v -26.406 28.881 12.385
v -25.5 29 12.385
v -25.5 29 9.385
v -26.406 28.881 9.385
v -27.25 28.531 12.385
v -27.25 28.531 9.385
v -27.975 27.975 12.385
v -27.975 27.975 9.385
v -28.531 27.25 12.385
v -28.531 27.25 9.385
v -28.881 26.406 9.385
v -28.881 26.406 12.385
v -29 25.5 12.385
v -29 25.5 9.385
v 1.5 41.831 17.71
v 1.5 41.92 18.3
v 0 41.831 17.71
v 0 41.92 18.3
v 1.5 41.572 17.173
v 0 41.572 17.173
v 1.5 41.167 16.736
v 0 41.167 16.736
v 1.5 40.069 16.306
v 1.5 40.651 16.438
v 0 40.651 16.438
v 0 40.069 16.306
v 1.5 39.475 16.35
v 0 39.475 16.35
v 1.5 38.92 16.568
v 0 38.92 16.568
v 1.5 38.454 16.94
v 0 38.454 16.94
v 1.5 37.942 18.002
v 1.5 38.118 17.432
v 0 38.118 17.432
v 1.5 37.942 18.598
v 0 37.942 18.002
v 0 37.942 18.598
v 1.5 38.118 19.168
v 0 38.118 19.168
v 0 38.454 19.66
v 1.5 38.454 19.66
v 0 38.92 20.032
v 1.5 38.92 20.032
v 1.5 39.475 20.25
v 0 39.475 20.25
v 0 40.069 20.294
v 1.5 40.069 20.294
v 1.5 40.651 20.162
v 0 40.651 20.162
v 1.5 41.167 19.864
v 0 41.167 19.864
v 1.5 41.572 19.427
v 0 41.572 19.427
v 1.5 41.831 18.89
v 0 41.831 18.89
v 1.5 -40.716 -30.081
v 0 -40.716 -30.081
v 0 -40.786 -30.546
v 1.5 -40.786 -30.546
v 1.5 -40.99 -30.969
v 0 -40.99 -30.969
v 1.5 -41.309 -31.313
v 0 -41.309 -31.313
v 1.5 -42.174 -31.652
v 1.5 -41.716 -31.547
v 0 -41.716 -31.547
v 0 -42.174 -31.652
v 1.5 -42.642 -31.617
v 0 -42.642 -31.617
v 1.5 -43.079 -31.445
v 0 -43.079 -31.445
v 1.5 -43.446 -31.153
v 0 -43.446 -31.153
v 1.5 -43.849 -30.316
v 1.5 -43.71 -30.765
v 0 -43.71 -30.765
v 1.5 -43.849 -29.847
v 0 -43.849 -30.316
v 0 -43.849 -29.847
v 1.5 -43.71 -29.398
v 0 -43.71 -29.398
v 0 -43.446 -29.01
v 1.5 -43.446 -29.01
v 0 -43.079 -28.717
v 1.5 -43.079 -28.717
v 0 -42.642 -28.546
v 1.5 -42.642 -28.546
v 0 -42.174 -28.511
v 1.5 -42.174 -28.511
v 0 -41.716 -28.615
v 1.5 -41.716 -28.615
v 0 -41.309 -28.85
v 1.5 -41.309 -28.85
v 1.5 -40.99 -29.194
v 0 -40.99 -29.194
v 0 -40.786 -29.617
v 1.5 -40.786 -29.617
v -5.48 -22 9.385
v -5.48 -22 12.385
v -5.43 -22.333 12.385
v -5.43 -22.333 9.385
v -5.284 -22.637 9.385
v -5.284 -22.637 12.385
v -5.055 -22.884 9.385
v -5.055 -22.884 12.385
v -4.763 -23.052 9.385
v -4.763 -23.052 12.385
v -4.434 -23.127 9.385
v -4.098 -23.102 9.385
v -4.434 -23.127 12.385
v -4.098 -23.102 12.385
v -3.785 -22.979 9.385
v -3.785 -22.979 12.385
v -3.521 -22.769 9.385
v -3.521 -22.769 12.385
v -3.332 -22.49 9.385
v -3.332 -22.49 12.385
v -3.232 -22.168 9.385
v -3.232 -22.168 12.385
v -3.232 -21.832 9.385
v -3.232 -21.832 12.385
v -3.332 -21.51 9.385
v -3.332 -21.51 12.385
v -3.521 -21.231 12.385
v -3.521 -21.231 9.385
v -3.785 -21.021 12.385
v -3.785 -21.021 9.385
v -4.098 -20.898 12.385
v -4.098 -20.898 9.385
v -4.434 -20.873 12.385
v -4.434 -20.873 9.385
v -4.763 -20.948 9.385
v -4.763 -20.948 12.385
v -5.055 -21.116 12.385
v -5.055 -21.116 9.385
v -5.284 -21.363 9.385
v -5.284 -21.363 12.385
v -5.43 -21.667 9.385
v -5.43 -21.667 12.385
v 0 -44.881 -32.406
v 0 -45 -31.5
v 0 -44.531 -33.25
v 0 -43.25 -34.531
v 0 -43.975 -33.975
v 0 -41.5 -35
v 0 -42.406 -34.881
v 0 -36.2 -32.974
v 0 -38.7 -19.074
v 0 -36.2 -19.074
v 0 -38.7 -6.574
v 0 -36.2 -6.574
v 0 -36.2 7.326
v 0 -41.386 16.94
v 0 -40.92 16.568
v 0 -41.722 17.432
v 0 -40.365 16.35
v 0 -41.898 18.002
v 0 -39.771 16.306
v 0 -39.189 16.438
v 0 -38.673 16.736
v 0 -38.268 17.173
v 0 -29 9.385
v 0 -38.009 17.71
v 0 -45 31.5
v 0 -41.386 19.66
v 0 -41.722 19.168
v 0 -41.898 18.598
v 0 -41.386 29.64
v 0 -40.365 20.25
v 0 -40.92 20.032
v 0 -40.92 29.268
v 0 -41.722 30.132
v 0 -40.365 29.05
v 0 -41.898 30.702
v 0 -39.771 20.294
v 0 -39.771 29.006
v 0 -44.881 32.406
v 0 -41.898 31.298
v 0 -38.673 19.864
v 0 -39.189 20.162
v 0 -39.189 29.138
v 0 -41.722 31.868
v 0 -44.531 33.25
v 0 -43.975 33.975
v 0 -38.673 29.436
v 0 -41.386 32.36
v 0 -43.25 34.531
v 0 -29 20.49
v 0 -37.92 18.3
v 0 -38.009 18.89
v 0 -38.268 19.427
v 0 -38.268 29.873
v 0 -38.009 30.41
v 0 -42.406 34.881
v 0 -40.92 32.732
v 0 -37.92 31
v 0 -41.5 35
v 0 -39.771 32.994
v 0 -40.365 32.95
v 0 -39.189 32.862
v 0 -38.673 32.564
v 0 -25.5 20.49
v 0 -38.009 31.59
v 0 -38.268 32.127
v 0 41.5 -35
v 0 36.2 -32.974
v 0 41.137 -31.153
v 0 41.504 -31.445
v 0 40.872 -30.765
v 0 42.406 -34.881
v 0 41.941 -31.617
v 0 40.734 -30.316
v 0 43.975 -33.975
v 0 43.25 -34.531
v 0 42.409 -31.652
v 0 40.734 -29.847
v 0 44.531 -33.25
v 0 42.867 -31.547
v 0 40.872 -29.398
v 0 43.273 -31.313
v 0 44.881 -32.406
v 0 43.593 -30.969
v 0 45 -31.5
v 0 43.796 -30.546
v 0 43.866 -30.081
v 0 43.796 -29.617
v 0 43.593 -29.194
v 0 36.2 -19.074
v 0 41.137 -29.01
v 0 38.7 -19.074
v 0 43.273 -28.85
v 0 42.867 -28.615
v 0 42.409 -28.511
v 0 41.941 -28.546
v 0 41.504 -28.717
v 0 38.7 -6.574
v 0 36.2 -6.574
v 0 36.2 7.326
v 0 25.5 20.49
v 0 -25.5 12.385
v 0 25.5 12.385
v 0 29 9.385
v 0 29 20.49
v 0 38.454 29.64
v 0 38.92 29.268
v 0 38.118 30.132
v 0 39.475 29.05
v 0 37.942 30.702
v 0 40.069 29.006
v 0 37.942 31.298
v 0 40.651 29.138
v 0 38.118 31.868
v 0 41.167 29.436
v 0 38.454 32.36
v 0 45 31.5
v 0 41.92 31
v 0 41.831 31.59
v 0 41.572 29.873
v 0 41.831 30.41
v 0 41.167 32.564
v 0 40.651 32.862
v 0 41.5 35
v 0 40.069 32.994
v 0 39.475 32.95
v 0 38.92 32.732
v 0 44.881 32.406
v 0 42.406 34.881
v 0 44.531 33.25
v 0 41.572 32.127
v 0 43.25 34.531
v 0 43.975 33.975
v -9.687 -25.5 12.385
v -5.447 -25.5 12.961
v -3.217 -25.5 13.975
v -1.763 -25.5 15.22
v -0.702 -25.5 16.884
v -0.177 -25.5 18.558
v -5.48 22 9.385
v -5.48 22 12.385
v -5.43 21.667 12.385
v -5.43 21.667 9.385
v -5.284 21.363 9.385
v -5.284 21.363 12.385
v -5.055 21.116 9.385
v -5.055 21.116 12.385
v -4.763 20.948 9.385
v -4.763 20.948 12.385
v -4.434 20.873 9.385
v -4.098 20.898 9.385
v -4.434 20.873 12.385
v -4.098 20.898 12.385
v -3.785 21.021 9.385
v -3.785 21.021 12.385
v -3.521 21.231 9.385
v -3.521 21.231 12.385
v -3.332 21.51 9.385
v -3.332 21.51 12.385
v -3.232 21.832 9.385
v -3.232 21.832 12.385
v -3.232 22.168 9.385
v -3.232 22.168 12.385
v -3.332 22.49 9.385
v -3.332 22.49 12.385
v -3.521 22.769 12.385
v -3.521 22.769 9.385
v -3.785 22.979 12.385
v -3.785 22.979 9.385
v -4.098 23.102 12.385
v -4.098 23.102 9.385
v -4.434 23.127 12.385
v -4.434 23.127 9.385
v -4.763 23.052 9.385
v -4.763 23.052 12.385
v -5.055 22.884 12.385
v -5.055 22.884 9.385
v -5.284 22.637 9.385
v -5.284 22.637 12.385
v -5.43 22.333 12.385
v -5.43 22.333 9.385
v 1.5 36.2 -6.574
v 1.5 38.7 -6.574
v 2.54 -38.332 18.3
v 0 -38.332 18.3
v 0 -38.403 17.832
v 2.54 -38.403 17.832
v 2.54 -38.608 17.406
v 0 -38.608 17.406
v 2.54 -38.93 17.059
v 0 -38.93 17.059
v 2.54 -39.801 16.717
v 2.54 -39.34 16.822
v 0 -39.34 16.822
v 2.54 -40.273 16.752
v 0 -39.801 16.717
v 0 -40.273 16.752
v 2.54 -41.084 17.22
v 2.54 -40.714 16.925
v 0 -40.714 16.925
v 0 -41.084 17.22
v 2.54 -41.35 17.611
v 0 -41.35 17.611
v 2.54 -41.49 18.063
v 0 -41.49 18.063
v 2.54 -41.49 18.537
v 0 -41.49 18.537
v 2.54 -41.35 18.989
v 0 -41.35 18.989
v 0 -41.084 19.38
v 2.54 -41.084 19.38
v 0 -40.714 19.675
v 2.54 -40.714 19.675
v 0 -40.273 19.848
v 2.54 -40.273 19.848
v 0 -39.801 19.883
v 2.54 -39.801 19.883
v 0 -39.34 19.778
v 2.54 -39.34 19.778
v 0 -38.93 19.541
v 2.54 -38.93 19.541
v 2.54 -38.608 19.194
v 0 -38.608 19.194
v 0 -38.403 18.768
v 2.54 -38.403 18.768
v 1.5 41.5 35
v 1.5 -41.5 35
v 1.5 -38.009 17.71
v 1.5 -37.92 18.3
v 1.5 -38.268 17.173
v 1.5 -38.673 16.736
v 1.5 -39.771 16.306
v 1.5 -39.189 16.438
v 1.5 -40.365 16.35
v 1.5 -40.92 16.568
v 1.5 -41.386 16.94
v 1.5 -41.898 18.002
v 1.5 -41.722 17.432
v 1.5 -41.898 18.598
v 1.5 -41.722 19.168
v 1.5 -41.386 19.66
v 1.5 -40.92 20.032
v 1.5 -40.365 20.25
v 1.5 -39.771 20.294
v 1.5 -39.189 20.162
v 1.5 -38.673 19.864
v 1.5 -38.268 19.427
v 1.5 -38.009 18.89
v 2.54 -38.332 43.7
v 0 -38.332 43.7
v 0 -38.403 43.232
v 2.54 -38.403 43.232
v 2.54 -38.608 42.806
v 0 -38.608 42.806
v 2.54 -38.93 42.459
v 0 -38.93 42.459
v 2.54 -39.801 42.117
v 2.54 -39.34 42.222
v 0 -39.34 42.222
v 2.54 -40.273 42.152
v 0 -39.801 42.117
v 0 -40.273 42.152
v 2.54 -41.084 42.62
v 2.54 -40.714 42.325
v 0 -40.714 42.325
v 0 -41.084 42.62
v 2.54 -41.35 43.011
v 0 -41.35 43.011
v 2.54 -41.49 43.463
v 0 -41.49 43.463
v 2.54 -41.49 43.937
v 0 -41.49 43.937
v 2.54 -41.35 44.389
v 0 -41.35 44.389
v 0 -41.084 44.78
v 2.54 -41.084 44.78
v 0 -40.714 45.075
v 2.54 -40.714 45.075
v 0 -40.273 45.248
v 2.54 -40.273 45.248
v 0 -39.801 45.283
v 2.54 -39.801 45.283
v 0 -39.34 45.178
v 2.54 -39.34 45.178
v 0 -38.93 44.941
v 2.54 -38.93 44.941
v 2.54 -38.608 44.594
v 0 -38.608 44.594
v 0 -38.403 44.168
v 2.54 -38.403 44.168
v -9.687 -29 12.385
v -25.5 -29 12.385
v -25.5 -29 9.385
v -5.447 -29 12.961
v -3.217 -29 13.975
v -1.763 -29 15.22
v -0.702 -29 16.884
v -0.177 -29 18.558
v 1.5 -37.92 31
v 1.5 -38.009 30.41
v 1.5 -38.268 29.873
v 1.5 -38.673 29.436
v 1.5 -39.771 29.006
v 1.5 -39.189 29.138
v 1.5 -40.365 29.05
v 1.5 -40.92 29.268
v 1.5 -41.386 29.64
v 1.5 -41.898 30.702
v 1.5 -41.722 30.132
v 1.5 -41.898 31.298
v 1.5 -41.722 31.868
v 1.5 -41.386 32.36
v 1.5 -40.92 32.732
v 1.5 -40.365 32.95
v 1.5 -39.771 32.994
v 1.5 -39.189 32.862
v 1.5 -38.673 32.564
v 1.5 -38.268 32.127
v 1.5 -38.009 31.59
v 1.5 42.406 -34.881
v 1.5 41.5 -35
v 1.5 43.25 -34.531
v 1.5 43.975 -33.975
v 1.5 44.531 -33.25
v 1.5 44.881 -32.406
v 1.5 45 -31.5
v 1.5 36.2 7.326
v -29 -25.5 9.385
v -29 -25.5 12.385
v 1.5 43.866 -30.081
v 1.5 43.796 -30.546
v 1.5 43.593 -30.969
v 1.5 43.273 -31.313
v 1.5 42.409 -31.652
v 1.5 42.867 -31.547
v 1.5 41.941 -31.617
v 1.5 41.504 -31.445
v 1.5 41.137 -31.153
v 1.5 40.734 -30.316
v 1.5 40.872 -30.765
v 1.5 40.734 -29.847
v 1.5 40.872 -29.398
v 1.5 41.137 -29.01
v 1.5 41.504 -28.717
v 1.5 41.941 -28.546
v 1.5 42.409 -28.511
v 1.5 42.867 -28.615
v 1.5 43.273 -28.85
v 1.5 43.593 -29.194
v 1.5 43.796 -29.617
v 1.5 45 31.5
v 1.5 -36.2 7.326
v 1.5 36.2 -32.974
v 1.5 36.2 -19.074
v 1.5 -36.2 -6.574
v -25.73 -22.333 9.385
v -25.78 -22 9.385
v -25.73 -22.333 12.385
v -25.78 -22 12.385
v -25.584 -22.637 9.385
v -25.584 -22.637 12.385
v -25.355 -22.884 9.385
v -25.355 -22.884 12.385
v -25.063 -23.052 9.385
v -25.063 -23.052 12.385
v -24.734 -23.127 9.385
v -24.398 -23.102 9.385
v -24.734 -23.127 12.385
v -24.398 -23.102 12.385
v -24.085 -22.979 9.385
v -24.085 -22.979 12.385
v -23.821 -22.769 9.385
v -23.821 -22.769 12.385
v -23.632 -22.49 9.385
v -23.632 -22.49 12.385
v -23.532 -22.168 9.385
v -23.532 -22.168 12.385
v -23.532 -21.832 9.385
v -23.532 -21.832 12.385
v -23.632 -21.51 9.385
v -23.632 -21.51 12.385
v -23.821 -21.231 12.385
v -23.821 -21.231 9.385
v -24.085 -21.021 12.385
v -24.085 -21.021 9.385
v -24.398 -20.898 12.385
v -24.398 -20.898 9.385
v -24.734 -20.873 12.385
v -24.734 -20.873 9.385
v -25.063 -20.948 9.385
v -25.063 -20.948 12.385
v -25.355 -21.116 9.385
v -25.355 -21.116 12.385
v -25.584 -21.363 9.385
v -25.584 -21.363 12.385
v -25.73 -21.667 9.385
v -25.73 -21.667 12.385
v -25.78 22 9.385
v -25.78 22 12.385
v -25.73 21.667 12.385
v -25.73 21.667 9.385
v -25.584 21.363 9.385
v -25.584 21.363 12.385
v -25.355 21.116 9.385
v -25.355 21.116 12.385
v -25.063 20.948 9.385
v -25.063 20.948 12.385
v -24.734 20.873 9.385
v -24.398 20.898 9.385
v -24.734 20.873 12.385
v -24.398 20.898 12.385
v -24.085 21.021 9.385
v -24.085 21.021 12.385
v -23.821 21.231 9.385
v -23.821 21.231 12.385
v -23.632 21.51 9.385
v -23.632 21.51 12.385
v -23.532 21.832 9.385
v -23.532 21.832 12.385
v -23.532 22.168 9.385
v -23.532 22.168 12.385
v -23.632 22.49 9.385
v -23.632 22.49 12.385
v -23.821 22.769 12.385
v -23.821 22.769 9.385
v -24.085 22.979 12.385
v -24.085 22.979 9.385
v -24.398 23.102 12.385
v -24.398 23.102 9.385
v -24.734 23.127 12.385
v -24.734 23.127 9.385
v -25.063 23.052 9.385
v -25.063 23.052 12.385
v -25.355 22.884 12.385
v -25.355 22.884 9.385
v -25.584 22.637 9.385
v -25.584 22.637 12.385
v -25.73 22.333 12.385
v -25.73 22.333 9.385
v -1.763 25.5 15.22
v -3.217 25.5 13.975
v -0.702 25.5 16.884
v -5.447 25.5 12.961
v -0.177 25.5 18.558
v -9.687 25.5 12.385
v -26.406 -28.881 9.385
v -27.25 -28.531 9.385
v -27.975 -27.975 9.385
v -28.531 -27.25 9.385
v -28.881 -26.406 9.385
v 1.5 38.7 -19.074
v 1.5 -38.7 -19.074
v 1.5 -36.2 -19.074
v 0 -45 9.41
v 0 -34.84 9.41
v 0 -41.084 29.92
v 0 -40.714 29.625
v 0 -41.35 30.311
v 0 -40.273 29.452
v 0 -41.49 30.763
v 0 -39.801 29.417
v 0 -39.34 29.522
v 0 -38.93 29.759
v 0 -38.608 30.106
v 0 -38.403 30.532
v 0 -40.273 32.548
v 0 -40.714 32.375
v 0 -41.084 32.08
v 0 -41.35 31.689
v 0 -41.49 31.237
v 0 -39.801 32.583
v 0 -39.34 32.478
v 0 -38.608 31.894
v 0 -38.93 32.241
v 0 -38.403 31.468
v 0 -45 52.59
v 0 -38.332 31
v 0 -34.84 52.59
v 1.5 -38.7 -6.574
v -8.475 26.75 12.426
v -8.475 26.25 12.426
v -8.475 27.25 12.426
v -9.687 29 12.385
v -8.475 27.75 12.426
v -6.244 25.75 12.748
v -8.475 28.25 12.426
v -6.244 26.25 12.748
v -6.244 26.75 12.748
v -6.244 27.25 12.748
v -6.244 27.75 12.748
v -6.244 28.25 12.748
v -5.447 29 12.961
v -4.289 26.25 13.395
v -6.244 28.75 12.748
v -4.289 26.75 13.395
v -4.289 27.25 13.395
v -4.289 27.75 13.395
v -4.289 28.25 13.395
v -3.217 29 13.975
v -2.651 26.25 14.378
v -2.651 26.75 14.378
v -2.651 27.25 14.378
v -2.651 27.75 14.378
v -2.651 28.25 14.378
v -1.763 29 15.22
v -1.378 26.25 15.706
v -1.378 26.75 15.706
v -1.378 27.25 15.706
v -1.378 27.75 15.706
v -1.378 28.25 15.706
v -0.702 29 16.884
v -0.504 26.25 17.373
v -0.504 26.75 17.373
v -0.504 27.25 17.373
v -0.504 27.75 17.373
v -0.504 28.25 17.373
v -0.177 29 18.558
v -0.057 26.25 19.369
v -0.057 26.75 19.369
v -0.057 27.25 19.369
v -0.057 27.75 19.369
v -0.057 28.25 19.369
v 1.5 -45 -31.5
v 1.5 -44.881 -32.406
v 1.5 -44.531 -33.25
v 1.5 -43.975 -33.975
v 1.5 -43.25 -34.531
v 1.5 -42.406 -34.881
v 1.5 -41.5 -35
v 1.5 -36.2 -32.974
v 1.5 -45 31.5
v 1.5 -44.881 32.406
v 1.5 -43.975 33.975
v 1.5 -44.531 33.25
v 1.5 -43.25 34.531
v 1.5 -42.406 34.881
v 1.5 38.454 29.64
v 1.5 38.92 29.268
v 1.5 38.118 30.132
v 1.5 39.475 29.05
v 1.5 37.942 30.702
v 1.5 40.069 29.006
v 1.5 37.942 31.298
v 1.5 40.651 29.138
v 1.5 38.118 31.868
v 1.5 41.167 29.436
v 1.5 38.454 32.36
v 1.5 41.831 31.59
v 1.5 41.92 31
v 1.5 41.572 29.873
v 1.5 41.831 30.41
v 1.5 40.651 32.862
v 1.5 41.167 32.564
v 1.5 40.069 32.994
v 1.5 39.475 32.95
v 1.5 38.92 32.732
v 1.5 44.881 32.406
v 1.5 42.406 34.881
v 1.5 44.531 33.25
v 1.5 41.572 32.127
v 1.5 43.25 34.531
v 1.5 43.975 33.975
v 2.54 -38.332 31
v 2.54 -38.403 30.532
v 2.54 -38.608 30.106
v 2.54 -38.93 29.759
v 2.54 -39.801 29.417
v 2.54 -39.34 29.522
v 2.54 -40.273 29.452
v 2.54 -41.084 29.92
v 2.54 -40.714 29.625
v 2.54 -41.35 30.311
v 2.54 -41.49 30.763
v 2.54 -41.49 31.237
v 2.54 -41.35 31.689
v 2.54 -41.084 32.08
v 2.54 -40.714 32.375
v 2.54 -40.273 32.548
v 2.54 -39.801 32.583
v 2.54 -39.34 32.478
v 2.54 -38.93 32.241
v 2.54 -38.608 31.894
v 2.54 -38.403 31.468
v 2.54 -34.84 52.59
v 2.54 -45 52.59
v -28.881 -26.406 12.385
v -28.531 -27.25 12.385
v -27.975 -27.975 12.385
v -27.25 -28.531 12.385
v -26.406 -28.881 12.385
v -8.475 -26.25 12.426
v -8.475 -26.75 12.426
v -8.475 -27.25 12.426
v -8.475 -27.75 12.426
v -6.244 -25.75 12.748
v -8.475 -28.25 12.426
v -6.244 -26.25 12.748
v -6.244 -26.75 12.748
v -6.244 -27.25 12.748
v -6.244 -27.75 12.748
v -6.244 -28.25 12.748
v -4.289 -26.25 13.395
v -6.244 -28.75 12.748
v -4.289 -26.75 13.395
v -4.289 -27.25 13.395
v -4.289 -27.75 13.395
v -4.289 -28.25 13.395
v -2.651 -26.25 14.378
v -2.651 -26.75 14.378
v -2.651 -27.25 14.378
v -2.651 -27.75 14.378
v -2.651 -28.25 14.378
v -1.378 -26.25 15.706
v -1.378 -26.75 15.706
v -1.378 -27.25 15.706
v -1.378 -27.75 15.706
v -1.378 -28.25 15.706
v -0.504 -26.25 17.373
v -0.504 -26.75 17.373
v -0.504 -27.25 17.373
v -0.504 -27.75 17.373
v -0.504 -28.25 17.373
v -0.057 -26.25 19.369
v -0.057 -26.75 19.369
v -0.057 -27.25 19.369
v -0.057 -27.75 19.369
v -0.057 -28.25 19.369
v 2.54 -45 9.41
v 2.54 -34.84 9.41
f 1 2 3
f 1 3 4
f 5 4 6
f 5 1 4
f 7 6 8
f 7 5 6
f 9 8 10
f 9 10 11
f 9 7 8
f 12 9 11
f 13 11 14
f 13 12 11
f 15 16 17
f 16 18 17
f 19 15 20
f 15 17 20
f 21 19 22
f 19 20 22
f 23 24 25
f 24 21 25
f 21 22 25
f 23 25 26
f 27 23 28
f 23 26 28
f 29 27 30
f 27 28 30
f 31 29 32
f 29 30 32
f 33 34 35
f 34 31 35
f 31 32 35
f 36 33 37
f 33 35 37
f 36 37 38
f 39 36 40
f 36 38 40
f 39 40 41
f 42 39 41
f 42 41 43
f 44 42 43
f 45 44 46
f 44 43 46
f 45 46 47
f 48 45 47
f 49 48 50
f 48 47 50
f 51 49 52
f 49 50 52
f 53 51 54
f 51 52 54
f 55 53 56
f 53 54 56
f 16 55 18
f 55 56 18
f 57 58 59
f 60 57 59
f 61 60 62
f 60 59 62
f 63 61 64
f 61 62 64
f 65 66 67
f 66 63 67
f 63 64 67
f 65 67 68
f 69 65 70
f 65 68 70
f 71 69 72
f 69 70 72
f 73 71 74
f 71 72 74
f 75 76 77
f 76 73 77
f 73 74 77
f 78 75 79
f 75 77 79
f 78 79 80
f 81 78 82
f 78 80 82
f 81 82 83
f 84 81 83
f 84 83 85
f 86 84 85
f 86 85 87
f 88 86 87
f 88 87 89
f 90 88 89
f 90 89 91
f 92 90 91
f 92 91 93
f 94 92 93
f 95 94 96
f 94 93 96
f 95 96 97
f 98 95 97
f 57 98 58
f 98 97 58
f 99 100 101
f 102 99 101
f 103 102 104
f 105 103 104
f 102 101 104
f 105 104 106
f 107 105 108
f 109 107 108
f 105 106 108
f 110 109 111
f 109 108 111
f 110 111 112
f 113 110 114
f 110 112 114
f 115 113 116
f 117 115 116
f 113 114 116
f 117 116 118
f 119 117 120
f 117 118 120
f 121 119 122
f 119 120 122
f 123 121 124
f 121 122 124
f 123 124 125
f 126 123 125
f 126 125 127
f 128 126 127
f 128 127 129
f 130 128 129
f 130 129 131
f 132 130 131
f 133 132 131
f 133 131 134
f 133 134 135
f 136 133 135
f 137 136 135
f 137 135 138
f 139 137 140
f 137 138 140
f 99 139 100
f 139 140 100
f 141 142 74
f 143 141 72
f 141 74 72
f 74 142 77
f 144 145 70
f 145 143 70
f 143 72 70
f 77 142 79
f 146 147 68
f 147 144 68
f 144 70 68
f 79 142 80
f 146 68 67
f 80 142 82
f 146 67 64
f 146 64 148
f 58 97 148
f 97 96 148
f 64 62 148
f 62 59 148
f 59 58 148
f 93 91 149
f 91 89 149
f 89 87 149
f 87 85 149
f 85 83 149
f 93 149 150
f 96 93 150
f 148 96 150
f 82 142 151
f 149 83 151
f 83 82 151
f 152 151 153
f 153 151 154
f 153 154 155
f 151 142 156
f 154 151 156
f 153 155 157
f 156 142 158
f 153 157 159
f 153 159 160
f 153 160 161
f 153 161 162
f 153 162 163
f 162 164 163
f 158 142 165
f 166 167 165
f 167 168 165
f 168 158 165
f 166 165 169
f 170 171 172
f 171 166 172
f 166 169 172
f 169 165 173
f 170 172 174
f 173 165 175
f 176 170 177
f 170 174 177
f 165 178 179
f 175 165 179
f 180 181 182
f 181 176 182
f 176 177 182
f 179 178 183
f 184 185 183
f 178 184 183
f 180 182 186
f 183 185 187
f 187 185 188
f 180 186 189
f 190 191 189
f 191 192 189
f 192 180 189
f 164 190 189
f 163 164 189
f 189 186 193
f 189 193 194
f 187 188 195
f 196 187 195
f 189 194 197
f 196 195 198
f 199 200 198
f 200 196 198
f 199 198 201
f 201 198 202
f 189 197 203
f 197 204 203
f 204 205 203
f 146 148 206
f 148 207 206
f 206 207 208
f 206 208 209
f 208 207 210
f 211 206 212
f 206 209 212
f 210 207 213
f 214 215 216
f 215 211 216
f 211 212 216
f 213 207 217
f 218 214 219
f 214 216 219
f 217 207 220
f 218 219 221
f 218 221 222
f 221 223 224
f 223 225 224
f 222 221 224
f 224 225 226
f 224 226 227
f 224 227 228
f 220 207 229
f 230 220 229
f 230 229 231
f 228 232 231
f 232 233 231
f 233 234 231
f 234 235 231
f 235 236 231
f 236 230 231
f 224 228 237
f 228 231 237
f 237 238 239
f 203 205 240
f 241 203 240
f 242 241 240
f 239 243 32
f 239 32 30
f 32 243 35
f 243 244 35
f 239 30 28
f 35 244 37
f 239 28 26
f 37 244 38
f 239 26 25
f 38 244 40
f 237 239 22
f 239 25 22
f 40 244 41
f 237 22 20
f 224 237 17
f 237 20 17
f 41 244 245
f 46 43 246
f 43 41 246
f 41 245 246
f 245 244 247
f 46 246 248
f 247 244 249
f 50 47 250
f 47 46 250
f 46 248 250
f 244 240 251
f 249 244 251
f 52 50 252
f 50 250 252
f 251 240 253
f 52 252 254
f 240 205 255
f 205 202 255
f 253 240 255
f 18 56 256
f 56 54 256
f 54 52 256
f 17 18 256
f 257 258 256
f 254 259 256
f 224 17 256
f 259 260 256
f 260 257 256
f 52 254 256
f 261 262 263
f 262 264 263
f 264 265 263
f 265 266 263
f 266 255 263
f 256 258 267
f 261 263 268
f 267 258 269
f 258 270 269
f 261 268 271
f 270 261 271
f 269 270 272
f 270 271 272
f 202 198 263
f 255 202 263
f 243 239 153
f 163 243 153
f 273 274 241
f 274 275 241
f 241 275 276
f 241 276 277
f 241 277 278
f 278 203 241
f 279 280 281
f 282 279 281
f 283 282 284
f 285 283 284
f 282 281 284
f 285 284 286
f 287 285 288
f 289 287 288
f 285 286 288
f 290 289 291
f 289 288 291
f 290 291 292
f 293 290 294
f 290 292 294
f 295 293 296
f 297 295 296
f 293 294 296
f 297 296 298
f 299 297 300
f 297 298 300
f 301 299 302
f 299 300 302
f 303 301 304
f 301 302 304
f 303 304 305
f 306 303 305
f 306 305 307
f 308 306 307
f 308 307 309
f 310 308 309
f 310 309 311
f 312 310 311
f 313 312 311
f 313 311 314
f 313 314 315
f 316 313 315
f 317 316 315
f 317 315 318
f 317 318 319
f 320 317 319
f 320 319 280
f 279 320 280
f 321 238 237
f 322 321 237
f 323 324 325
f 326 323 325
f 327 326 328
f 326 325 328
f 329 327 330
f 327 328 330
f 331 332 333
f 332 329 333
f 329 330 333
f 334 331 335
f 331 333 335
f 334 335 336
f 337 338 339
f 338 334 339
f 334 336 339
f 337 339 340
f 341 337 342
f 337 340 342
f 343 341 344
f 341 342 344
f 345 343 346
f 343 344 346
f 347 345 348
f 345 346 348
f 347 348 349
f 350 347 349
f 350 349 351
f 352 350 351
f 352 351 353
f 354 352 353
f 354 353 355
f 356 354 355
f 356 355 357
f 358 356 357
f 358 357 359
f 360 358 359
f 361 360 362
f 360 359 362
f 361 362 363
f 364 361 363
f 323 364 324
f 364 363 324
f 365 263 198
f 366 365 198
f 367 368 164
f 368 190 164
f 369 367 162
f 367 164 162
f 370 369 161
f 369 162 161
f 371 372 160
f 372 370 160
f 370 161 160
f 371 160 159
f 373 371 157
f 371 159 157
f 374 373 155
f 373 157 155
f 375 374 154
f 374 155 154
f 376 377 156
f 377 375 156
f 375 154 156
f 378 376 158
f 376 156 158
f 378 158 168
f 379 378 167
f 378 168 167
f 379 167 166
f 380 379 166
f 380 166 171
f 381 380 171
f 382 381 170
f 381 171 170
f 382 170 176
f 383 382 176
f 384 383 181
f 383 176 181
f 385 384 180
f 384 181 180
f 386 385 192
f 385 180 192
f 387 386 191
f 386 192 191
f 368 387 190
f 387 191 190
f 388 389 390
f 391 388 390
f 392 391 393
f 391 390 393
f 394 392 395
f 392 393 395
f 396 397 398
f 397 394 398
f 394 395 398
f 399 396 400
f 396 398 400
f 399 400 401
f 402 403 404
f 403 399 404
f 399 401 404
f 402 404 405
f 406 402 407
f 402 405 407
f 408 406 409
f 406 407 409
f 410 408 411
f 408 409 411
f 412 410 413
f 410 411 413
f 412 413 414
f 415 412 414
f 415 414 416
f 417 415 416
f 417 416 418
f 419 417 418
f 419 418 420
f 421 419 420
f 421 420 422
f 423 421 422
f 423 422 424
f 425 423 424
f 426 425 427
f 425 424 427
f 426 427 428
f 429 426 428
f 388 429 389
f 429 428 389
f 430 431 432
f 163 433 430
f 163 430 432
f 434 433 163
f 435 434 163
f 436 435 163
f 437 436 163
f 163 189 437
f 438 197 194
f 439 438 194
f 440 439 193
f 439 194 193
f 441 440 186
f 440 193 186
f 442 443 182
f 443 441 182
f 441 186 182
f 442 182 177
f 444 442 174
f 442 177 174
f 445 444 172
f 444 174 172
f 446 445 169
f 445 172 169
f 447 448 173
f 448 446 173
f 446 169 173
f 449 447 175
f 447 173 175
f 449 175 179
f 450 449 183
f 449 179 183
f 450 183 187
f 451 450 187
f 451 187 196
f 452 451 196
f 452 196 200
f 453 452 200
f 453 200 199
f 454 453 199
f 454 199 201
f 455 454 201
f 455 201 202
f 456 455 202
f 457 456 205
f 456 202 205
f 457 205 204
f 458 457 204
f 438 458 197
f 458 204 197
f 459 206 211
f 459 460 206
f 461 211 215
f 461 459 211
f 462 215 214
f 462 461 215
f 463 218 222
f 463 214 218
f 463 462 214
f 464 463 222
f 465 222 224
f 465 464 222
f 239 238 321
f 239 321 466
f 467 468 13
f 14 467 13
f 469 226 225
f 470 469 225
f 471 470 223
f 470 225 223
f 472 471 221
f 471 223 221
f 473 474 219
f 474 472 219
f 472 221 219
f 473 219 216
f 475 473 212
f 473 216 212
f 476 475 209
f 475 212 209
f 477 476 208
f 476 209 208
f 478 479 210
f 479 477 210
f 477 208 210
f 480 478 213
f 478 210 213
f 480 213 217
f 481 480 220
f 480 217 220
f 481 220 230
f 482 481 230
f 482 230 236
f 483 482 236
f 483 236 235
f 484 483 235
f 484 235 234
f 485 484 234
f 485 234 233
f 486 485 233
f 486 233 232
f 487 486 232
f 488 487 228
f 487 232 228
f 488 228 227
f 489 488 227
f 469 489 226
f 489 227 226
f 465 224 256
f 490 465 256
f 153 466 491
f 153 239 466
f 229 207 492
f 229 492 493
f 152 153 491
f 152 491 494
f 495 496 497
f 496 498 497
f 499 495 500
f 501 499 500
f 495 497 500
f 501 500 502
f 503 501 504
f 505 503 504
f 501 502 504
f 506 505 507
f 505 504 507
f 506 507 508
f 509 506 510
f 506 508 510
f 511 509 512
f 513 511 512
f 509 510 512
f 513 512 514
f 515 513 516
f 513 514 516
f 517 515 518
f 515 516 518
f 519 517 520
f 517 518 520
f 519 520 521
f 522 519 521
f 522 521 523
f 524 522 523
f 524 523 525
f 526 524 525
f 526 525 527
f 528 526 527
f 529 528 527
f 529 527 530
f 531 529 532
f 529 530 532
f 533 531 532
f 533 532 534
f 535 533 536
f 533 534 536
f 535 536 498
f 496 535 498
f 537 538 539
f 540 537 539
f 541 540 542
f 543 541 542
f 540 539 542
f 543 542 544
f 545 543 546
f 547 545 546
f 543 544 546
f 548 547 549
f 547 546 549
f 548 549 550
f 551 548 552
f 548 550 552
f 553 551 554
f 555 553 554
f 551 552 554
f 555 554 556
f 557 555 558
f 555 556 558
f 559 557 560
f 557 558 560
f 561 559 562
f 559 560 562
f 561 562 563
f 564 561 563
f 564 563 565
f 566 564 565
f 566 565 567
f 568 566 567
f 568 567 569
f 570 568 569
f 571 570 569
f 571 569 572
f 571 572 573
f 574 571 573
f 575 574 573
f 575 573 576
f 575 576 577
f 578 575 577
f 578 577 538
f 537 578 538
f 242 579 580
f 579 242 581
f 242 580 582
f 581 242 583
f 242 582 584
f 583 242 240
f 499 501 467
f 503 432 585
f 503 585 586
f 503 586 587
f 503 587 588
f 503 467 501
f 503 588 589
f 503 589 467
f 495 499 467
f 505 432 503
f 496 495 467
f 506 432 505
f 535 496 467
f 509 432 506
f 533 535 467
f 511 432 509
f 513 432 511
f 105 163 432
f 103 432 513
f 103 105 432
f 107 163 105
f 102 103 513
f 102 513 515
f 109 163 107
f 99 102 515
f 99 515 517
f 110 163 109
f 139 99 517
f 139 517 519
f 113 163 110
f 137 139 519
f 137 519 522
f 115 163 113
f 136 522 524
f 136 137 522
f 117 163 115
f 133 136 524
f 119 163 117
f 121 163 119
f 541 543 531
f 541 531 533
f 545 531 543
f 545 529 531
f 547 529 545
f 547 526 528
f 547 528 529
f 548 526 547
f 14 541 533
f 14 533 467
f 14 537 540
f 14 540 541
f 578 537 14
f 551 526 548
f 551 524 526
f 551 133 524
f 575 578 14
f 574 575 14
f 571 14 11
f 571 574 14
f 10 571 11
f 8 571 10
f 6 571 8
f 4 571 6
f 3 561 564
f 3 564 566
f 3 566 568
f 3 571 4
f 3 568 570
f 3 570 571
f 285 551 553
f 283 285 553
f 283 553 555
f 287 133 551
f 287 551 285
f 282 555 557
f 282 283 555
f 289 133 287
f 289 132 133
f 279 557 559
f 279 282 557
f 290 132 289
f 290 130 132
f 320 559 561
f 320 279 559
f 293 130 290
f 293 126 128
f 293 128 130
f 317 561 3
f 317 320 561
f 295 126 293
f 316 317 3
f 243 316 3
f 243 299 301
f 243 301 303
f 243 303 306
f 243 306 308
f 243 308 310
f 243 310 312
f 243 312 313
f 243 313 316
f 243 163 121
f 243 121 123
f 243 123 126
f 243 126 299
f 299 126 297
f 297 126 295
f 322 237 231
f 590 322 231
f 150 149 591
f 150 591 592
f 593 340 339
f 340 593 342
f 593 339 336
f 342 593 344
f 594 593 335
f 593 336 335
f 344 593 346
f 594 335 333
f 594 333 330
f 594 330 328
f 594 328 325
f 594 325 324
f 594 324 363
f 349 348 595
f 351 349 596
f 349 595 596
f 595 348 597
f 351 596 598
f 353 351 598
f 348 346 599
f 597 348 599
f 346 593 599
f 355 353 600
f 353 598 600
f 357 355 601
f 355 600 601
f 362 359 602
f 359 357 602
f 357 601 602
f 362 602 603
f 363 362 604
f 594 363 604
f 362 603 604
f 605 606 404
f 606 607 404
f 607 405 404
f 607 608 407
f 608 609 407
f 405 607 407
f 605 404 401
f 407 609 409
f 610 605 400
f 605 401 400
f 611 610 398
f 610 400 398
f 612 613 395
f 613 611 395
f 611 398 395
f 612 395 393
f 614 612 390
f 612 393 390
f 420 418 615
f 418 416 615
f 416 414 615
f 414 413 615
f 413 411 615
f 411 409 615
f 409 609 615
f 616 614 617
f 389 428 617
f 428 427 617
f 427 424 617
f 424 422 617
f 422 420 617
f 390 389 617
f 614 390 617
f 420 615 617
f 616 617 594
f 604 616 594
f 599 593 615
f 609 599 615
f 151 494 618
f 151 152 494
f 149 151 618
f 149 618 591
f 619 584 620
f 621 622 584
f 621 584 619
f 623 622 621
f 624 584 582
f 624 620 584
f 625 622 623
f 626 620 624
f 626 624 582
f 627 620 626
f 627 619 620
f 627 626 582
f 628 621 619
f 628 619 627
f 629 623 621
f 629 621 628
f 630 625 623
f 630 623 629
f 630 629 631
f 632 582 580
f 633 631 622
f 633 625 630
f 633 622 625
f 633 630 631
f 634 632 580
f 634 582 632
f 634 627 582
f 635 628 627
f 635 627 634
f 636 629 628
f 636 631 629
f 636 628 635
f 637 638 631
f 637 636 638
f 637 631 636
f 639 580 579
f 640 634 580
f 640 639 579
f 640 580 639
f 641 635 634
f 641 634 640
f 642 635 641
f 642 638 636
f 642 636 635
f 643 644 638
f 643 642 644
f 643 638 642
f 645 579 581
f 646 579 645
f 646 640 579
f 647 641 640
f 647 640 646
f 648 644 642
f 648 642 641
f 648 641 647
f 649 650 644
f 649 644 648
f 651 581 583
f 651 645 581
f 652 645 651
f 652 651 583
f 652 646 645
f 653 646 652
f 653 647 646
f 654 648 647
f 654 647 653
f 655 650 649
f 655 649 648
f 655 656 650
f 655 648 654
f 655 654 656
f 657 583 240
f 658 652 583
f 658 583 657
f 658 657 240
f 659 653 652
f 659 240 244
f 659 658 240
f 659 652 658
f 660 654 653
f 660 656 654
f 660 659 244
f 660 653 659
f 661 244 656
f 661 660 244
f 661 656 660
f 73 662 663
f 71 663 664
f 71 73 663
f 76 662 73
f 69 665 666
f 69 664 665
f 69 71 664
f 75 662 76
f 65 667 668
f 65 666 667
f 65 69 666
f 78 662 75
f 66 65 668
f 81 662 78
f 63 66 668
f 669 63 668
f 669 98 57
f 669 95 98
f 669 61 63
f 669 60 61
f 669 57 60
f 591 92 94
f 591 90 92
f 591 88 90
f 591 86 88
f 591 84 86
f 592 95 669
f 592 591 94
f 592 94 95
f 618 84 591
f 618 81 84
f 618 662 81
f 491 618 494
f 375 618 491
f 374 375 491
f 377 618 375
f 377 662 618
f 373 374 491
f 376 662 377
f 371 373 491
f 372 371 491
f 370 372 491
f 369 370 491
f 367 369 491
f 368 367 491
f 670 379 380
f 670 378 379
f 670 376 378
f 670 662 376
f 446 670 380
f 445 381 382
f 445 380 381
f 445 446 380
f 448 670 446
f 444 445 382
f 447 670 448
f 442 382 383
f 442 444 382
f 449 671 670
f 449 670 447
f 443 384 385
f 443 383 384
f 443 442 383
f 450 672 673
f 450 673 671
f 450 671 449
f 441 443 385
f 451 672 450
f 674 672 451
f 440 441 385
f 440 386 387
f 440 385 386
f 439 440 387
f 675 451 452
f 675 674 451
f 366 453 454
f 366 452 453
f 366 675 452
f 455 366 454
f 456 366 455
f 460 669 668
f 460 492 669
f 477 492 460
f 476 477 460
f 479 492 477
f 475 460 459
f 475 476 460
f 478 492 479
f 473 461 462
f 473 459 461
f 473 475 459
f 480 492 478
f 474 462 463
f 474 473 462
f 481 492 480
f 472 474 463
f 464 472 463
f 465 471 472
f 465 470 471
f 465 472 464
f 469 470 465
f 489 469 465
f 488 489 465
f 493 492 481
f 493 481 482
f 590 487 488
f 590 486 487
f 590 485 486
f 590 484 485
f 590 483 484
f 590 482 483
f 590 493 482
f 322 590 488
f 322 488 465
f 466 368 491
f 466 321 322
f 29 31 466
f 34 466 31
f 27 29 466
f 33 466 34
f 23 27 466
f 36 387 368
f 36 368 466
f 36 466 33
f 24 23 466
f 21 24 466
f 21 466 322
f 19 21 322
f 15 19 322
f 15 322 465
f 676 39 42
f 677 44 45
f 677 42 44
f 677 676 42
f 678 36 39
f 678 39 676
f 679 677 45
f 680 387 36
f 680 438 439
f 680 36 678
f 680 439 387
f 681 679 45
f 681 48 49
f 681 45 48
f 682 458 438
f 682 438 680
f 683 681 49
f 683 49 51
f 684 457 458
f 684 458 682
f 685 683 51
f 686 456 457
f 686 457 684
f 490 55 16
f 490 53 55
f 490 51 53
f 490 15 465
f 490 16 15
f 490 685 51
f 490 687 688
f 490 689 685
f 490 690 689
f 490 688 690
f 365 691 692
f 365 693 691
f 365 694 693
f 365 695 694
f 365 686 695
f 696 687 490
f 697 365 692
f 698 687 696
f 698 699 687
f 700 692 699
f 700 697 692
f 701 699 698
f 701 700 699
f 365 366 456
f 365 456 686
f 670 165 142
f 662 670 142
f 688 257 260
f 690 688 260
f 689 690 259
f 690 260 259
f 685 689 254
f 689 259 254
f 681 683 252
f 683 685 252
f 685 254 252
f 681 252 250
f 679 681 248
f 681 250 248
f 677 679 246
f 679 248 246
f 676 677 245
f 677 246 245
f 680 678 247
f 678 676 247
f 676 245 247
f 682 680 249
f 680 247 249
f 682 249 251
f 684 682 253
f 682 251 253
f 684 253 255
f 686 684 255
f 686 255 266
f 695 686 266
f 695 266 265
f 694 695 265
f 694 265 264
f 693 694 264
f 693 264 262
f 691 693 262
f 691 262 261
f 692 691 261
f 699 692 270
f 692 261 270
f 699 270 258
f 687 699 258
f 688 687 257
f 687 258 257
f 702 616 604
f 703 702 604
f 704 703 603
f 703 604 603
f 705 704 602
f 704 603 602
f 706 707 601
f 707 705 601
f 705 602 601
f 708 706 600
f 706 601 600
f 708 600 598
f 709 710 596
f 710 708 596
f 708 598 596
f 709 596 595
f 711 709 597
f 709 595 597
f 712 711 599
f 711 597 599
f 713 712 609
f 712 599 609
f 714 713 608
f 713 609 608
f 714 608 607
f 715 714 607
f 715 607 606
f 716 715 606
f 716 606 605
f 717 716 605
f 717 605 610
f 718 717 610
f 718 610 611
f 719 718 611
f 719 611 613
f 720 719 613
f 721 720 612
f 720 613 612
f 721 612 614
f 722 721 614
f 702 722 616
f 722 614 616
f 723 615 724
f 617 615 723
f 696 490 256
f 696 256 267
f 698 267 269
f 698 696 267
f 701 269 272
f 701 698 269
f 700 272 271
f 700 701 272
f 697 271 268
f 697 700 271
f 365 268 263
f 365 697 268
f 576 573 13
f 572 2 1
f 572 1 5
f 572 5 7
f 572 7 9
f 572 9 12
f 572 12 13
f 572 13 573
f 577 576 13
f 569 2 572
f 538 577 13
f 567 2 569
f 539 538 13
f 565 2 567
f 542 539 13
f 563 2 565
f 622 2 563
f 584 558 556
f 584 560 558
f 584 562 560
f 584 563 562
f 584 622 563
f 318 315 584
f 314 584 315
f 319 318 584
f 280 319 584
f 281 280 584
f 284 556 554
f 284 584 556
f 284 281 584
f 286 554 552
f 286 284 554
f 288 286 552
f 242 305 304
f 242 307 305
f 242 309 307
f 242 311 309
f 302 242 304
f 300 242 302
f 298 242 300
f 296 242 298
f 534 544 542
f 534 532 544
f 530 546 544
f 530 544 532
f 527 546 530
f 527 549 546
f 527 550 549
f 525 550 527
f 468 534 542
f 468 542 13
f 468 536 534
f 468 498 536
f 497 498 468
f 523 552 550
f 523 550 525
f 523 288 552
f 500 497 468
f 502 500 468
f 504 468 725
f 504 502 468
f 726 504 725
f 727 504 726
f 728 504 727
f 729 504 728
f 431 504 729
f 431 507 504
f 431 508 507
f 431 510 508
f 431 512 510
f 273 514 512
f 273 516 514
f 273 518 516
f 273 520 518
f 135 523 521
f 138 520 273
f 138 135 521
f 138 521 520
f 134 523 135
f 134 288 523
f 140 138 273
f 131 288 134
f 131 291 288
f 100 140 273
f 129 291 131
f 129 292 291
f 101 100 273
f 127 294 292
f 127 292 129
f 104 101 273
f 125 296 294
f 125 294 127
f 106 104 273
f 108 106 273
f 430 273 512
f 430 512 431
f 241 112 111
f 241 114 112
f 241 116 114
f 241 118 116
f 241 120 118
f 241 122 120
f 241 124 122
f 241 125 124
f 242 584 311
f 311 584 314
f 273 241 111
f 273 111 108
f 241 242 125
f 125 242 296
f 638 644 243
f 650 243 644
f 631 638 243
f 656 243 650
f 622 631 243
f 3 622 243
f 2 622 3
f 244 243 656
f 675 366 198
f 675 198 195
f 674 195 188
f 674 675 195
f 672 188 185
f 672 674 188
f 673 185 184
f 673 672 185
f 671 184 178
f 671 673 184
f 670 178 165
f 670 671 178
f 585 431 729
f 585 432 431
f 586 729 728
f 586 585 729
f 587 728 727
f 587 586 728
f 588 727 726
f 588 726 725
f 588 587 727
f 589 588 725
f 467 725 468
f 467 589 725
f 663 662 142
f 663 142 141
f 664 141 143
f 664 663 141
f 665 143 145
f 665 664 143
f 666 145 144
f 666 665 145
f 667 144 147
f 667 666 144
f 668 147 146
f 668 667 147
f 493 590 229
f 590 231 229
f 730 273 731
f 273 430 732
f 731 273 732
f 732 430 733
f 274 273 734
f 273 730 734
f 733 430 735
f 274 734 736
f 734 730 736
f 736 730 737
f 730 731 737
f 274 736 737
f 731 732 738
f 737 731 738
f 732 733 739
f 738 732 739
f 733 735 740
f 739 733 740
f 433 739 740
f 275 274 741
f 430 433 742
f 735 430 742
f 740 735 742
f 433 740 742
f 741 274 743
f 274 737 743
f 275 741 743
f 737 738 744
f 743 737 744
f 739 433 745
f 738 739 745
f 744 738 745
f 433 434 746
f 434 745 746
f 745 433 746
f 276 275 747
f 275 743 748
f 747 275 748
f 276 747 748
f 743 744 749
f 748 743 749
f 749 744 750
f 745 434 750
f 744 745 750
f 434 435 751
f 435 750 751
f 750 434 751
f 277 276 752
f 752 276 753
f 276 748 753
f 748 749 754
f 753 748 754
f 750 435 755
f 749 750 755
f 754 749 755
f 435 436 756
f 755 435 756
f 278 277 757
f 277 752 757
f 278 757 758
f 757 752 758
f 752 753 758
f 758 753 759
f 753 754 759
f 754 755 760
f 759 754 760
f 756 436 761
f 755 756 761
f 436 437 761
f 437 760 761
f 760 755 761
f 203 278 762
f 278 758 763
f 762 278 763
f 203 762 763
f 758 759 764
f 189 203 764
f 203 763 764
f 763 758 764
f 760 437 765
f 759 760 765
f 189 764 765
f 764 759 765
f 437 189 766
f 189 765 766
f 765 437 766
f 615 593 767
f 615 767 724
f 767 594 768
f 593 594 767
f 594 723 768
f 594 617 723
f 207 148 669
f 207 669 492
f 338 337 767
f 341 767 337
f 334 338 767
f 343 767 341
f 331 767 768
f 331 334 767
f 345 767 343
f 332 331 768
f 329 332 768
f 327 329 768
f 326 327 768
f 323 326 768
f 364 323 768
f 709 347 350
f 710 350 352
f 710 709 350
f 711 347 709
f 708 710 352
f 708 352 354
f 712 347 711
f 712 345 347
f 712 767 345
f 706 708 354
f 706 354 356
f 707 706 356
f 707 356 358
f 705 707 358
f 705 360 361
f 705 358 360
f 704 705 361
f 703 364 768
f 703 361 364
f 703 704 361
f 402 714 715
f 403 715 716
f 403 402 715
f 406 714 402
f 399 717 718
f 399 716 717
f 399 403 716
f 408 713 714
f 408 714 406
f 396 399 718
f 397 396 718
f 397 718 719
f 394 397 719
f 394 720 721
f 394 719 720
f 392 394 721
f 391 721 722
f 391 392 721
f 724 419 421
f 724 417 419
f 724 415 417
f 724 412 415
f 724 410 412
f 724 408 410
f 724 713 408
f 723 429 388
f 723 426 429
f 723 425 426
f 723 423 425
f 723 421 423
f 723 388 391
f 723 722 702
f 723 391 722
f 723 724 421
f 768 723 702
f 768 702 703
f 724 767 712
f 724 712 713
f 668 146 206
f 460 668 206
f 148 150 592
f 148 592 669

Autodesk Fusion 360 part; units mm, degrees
sketch "Sketch1" plane through (0, 0, 0) normal (1, 0, 0) x (0, 1, 0) in component "DIN_rain_mount1 v3"
  line L0 (-5.08, 21.59) -> (5.08, 21.59)
  line L1 (5.08, 21.59) -> (5.08, -21.59)
  line L2 (5.08, -21.59) -> (-5.08, -21.59)
  line L3 (-5.08, -21.59) -> (-5.08, 21.59)
  line L4 (-5.08, 21.59) -> (5.08, -21.59) construction
  line L5 (5.08, 21.59) -> (-5.08, -21.59) construction
  circle A0 centre (0, -12.7) radius 1.5875
  circle A1 centre (0, 0) radius 1.5875
  circle A2 centre (0, 12.7) radius 1.5875
  dimension "d5" = 10.16
  dimension "d6" = 43.18
  dimension "d7" = 3.175
  dimension "d10" = 6.35
  dimension "d11" = 12.7
extrude "Extrude1" add sketch "Sketch1" along normal blind 2.54 makes body 1 in component "DIN_rain_mount1 v3"
sketch "Sketch1 (2)" plane through (0, 0, 0) normal (1, 0, 0) x (0, 1, 0)
  line L0 (45, 35) -> (-45, 35)
  line L1 (-45, 35) -> (-45, -35)
  line L2 (-45, -35) -> (45, -35)
  line L3 (45, -35) -> (45, 35)
  line L4 (45, 35) -> (-45, -35) construction
  line L5 (-45, 35) -> (45, -35) construction
  line L6 (0, 0) -> (0, -35) construction
  line L7 (39.5, 8.6762) -> (-39.5, 8.6762) construction
  line L8 (-39.5, 8.6762) -> (-39.5, -34.3238) construction
  line L9 (-39.5, -34.3238) -> (39.5, -34.3238) construction
  line L10 (39.5, -34.3238) -> (39.5, 8.6762) construction
  line L11 (39.5, 8.6762) -> (-39.5, -34.3238) construction
  line L12 (-39.5, 8.6762) -> (39.5, -34.3238) construction
  line L13 (36.2, 7.3262) -> (-36.2, 7.3262)
  line L14 (-36.2, 7.3262) -> (-36.2, -32.9738)
  line L15 (-36.2, -32.9738) -> (36.2, -32.9738)
  line L16 (36.2, -32.9738) -> (36.2, 7.3262)
  line L17 (36.2, 7.3262) -> (-36.2, -32.9738) construction
  line L18 (-36.2, 7.3262) -> (36.2, -32.9738) construction
  circle A0 centre (42.2913, -30.0813) radius 1.575
  line L19 (0, 0) -> (10.5805, 0) construction
  circle A1 centre (-42.2913, -30.0813) radius 1.575
  circle A2 centre (42.2913, 30.0813) radius 1.575 construction
  circle A3 centre (-42.2913, 30.0813) radius 1.575 construction
  line L20 (0, 0) -> (0, 0.8708) construction
  line L21 (0, 0.8708) -> (0, 35) construction
  line L22 (25, 32.3854) -> (-25, 32.3854) construction
  line L23 (-25, 32.3854) -> (-25, 12.3854) construction
  line L24 (-25, 12.3854) -> (25, 12.3854) construction
  line L25 (25, 12.3854) -> (25, 32.3854) construction
  line L26 (25, 32.3854) -> (-25, 12.3854) construction
  line L27 (-25, 32.3854) -> (25, 12.3854) construction
  line L28 (29, 12.3854) -> (-29, 12.3854)
  line L29 (-29, 12.3854) -> (-29, 9.3854)
  line L30 (-29, 9.3854) -> (29, 9.3854)
  line L31 (29, 9.3854) -> (29, 12.3854)
  line L32 (29, 12.3854) -> (-29, 9.3854) construction
  line L33 (-29, 12.3854) -> (29, 9.3854) construction
  line L34 (0, -12.8238) -> (39.5, -12.8238) construction
  line L35 (36.2, -6.5738) -> (38.7, -6.5738)
  line L36 (38.7, -6.5738) -> (38.7, -19.0738)
  line L37 (38.7, -19.0738) -> (36.2, -19.0738)
  line L38 (36.2, -19.0738) -> (36.2, -6.5738)
  line L39 (-38.7, -19.0738) -> (-36.2, -19.0738)
  line L40 (-38.7, -6.5738) -> (-38.7, -19.0738)
  line L41 (-36.2, -6.5738) -> (-38.7, -6.5738)
  circle A4 centre (-39.92, 31) radius 2
  circle A5 centre (-39.92, 18.3) radius 2
  circle A6 centre (39.92, 31) radius 2
  circle A7 centre (39.92, 18.3) radius 2
  circle A8 centre (-39.92, 31) radius 1.5875
  circle A9 centre (-39.92, 18.3) radius 1.5875
  circle A10 centre (-39.92, 43.7) radius 1.5875
  line L42 (-45, 9.41) -> (-34.84, 9.41)
  line L43 (-34.84, 9.41) -> (-34.84, 52.59)
  line L44 (-34.84, 52.59) -> (-45, 52.59)
  line L45 (-45, 52.59) -> (-45, 9.41)
  point P0 (0, -12.8238)
  point P1 (0, -12.8238)
  point P2 (0, 22.3854)
  point P3 (0, 10.8854)
  point P4 (38.7, -12.8238)
  dimension "d8" = 90
  dimension "d9" = 70
  dimension "d12" = 79
  dimension "d13" = 43
  dimension "d14" = 72.4
  dimension "d15" = 40.3
  dimension "d17" = 3.15
  dimension "d21" = 50
  dimension "d22" = 20
  dimension "d25" = 58
  dimension "d26" = 3
  dimension "d58" = 2.5
  dimension "d59" = 12.5
  dimension "d62" = 4
  dimension "d63" = 4
extrude "Extrude1'" add sketch "Sketch1 (2)" along normal blind 1.5 separate body contours L0 L1 L2 L3 L42 L43 | L0 L1 L42 L43 L45 | L28 L29 L30 L31 makes body 2
extrude "Extrude2" add sketch "Sketch1 (2)" against normal blind 29 contours L28 L29 L30 L31 bodies 2
sketch "Sketch2" plane through (0, 0, 12.3854) normal (0, 0, 1) x (-1, 0, 0)
  line L0 (0, 29) -> (0, -29)
  line L1 (0, -29) -> (29, -29)
  line L2 (29, -29) -> (29, 29)
  line L3 (29, 29) -> (0, 29)
  line L4 (0, 29) -> (29, -29) construction
  line L5 (27.5, 25) -> (1.5, 25) construction
  line L6 (1.5, 25) -> (1.5, -25) construction
  line L7 (1.5, -25) -> (27.5, -25) construction
  line L8 (27.5, -25) -> (27.5, 25) construction
  line L9 (27.5, 25) -> (1.5, -25) construction
  line L10 (1.5, 25) -> (27.5, -25) construction
  circle A0 centre (4.35, -22) radius 1.575 construction
  circle A1 centre (24.65, -22) radius 1.575 construction
  circle A2 centre (4.35, 22) radius 1.575 construction
  circle A3 centre (24.65, 22) radius 1.575 construction
  line L11 (4.35, -22) -> (24.65, 22) construction
  circle A4 centre (4.35, -22) radius 1.1303
  circle A5 centre (24.65, -22) radius 1.1303
  circle A6 centre (4.35, 22) radius 1.1303
  circle A7 centre (24.65, 22) radius 1.1303
  point P0 (14.5, 0)
  point P1 (14.5, 0)
  point P2 (14.5, 0)
  dimension "d32" = 26
  dimension "d33" = 50
  dimension "d37" = 3.15
  dimension "d40" = 20.3
  dimension "d41" = 44
  dimension "d51" = 2.2606
  dimension "d54" = 20.3
  dimension "d55" = 44
fillet "Fillet1" radius 3.5 2 edges at (-29, 29, 10.8854) (-29, -29, 10.8854) on bodies 2
fillet "Fillet2" radius 3.5 4 edges at (0.75, 45, 35) (0.75, 45, -35) (0.75, -45, 35) (0.75, -45, -35) on bodies 2
sketch "Sketch3" plane through (0, -29, 0) normal (0, -1, 0) x (1, 0, 0)
  line L0 (-25.5, 12.3854) -> (-25.5, 9.3854)
  line L1 (-25.5, 9.3854) -> (0, 9.3854)
  line L2 (0, 9.3854) -> (0, 12.3854)
  line L3 (0, 12.3854) -> (-25.5, 12.3854)
  line L4 (0, 35) -> (0, -35) construction
  line L5 (-27.5, 12.3854) -> (-1.5, 12.3854) construction
  spline S0 degree 5 poles (-9.6866, 12.3854) (-9.3387, 12.3854) (-8.655, 12.4012) (-7.6662, 12.4723) (-6.4221, 12.6617) (-4.9991, 13.0566) (-3.7214, 13.6129) (-2.6063, 14.3356) (-1.6713, 15.2291) (-0.9285, 16.2912) (-0.387, 17.5173) (-0.1222, 18.6267) (-0.0222, 19.5305) (0, 20.1649) (0, 20.4901) knots 0 0 0 0 0 0 0.1 0.2 0.3 0.4 0.5 0.6 0.7 0.8 0.9 1 1 1 1 1 1
  line L6 (0, 18.6225) -> (0, 22.3578)
  line L7 (-11.558, 12.3854) -> (-7.8153, 12.3854)
  line L8 (-9.6866, 12.3854) -> (0, 12.3854)
  line L9 (0, 20.4901) -> (0, 12.3854)
  point P0 (-2.4919, 14.508)
extrude "Extrude3" add sketch "Sketch3" against normal blind 3.5 contours L3 S0 L6 L7 L8 L9 bodies 2
sketch "Sketch4" plane through (0, 29, 0) normal (0, 1, 0) x (-1, 0, 0)
  line L0 (25.5, 9.3854) -> (25.5, 12.3854)
  line L1 (25.5, 12.3854) -> (0, 12.3854)
  line L2 (0, 12.3854) -> (0, 9.3854)
  line L3 (0, 9.3854) -> (25.5, 9.3854)
  line L4 (0, 12.3854) -> (9.6866, 12.3854)
  spline S0 degree 5 poles (9.6866, 12.3854) (9.3387, 12.3854) (8.655, 12.4012) (7.6662, 12.4723) (6.4221, 12.6617) (4.9991, 13.0566) (3.7214, 13.6129) (2.6063, 14.3356) (1.6713, 15.2291) (0.9285, 16.2912) (0.387, 17.5173) (0.1222, 18.6267) (0.0222, 19.5305) (0, 20.1649) (0, 20.4901) knots 0 0 0 0 0 0 0.1 0.2 0.3 0.4 0.5 0.6 0.7 0.8 0.9 1 1 1 1 1 1
  line L5 (0, 20.4901) -> (0, 12.3854)
extrude "Extrude4" add sketch "Sketch4" against normal blind 3.5 contours L1 L4 S0 L5 bodies 2
extrude "Extrude5" cut sketch "Sketch2" against normal blind 3 contours A4 | A5 | A6 | A7 bodies 2
component "DIN_rain_mount1 v3" placed x (1, 0, 0) y (0, 1, 0) z (0, 0, 1) at (0, -39.92, 31)
equation "cutout_length = 71.4 mm" comment "71 mm from the manual"
equation "cutout_height = 39.3 mm" comment "39mm from the manual"
equation "plastic_thick = 1.5 mm"
equation "tab_width = 12 mm"
equation "tab_thick = 2.5 mm"
equation "panel_width = 90 mm"
equation "panel_height = 70 mm"
equation "d8 = panel_width"
equation "d9 = panel_height"
equation "power_supply_width = 79 mm"
equation "power_supply_height = 43 mm"
equation "d12 = power_supply_width"
equation "d13 = power_supply_height"
equation "d14 = cutout_length + clearance * 2"
equation "d15 = cutout_height + clearance * 2"
equation "mount_through_hole_diam = 3.15 mm"
equation "d17 = mount_through_hole_diam"
equation "relay_height = 20 mm"
equation "relay_length = 50 mm"
equation "relay_width = 26 mm"
equation "d21 = relay_length"
equation "d22 = relay_height"
equation "relay_ledge_thick = 3 mm"
equation "relay_ledge_length = relay_length + 8 mm"
equation "d25 = relay_ledge_length"
equation "d26 = relay_ledge_thick"
equation "relay_ledge_width = relay_width + 3 mm"
equation "d28 = plastic_thick"
equation "d30 = -relay_ledge_width"
equation "d32 = relay_width"
equation "d33 = relay_length"
equation "relay_dist_bw_holes_length = 44 mm"
equation "relay_dist_bw_holes_width = 20.3 mm"
equation "relay_hole_diam = 3.15 mm"
equation "d37 = relay_hole_diam"
equation "d40 = relay_dist_bw_holes_width"
equation "d41 = relay_dist_bw_holes_length"
equation "relay_mount_tap_diam = 0.089 in"
equation "d51 = relay_mount_tap_diam"
equation "d54 = relay_dist_bw_holes_width"
equation "d55 = relay_dist_bw_holes_length"
equation "d58 = tab_thick"
equation "d59 = tab_width + clearance"
equation "clearance = 0.5 mm"
equation "DIN_rail_mount_hole_diam = 4 mm"
equation "d62 = DIN_rail_mount_hole_diam"
equation "d63 = DIN_rail_mount_hole_diam"
equation "dist_bw_holes = 0.5 in"
equation "holes_diam = 0.125 in"
equation "DIN_rail_width = 0.4 in"
equation "DIN_rail_len = 1.7 in"
equation "d5 = DIN_rail_width"
equation "d6 = DIN_rail_len"
equation "d7 = holes_diam"
equation "d11 = dist_bw_holes"
